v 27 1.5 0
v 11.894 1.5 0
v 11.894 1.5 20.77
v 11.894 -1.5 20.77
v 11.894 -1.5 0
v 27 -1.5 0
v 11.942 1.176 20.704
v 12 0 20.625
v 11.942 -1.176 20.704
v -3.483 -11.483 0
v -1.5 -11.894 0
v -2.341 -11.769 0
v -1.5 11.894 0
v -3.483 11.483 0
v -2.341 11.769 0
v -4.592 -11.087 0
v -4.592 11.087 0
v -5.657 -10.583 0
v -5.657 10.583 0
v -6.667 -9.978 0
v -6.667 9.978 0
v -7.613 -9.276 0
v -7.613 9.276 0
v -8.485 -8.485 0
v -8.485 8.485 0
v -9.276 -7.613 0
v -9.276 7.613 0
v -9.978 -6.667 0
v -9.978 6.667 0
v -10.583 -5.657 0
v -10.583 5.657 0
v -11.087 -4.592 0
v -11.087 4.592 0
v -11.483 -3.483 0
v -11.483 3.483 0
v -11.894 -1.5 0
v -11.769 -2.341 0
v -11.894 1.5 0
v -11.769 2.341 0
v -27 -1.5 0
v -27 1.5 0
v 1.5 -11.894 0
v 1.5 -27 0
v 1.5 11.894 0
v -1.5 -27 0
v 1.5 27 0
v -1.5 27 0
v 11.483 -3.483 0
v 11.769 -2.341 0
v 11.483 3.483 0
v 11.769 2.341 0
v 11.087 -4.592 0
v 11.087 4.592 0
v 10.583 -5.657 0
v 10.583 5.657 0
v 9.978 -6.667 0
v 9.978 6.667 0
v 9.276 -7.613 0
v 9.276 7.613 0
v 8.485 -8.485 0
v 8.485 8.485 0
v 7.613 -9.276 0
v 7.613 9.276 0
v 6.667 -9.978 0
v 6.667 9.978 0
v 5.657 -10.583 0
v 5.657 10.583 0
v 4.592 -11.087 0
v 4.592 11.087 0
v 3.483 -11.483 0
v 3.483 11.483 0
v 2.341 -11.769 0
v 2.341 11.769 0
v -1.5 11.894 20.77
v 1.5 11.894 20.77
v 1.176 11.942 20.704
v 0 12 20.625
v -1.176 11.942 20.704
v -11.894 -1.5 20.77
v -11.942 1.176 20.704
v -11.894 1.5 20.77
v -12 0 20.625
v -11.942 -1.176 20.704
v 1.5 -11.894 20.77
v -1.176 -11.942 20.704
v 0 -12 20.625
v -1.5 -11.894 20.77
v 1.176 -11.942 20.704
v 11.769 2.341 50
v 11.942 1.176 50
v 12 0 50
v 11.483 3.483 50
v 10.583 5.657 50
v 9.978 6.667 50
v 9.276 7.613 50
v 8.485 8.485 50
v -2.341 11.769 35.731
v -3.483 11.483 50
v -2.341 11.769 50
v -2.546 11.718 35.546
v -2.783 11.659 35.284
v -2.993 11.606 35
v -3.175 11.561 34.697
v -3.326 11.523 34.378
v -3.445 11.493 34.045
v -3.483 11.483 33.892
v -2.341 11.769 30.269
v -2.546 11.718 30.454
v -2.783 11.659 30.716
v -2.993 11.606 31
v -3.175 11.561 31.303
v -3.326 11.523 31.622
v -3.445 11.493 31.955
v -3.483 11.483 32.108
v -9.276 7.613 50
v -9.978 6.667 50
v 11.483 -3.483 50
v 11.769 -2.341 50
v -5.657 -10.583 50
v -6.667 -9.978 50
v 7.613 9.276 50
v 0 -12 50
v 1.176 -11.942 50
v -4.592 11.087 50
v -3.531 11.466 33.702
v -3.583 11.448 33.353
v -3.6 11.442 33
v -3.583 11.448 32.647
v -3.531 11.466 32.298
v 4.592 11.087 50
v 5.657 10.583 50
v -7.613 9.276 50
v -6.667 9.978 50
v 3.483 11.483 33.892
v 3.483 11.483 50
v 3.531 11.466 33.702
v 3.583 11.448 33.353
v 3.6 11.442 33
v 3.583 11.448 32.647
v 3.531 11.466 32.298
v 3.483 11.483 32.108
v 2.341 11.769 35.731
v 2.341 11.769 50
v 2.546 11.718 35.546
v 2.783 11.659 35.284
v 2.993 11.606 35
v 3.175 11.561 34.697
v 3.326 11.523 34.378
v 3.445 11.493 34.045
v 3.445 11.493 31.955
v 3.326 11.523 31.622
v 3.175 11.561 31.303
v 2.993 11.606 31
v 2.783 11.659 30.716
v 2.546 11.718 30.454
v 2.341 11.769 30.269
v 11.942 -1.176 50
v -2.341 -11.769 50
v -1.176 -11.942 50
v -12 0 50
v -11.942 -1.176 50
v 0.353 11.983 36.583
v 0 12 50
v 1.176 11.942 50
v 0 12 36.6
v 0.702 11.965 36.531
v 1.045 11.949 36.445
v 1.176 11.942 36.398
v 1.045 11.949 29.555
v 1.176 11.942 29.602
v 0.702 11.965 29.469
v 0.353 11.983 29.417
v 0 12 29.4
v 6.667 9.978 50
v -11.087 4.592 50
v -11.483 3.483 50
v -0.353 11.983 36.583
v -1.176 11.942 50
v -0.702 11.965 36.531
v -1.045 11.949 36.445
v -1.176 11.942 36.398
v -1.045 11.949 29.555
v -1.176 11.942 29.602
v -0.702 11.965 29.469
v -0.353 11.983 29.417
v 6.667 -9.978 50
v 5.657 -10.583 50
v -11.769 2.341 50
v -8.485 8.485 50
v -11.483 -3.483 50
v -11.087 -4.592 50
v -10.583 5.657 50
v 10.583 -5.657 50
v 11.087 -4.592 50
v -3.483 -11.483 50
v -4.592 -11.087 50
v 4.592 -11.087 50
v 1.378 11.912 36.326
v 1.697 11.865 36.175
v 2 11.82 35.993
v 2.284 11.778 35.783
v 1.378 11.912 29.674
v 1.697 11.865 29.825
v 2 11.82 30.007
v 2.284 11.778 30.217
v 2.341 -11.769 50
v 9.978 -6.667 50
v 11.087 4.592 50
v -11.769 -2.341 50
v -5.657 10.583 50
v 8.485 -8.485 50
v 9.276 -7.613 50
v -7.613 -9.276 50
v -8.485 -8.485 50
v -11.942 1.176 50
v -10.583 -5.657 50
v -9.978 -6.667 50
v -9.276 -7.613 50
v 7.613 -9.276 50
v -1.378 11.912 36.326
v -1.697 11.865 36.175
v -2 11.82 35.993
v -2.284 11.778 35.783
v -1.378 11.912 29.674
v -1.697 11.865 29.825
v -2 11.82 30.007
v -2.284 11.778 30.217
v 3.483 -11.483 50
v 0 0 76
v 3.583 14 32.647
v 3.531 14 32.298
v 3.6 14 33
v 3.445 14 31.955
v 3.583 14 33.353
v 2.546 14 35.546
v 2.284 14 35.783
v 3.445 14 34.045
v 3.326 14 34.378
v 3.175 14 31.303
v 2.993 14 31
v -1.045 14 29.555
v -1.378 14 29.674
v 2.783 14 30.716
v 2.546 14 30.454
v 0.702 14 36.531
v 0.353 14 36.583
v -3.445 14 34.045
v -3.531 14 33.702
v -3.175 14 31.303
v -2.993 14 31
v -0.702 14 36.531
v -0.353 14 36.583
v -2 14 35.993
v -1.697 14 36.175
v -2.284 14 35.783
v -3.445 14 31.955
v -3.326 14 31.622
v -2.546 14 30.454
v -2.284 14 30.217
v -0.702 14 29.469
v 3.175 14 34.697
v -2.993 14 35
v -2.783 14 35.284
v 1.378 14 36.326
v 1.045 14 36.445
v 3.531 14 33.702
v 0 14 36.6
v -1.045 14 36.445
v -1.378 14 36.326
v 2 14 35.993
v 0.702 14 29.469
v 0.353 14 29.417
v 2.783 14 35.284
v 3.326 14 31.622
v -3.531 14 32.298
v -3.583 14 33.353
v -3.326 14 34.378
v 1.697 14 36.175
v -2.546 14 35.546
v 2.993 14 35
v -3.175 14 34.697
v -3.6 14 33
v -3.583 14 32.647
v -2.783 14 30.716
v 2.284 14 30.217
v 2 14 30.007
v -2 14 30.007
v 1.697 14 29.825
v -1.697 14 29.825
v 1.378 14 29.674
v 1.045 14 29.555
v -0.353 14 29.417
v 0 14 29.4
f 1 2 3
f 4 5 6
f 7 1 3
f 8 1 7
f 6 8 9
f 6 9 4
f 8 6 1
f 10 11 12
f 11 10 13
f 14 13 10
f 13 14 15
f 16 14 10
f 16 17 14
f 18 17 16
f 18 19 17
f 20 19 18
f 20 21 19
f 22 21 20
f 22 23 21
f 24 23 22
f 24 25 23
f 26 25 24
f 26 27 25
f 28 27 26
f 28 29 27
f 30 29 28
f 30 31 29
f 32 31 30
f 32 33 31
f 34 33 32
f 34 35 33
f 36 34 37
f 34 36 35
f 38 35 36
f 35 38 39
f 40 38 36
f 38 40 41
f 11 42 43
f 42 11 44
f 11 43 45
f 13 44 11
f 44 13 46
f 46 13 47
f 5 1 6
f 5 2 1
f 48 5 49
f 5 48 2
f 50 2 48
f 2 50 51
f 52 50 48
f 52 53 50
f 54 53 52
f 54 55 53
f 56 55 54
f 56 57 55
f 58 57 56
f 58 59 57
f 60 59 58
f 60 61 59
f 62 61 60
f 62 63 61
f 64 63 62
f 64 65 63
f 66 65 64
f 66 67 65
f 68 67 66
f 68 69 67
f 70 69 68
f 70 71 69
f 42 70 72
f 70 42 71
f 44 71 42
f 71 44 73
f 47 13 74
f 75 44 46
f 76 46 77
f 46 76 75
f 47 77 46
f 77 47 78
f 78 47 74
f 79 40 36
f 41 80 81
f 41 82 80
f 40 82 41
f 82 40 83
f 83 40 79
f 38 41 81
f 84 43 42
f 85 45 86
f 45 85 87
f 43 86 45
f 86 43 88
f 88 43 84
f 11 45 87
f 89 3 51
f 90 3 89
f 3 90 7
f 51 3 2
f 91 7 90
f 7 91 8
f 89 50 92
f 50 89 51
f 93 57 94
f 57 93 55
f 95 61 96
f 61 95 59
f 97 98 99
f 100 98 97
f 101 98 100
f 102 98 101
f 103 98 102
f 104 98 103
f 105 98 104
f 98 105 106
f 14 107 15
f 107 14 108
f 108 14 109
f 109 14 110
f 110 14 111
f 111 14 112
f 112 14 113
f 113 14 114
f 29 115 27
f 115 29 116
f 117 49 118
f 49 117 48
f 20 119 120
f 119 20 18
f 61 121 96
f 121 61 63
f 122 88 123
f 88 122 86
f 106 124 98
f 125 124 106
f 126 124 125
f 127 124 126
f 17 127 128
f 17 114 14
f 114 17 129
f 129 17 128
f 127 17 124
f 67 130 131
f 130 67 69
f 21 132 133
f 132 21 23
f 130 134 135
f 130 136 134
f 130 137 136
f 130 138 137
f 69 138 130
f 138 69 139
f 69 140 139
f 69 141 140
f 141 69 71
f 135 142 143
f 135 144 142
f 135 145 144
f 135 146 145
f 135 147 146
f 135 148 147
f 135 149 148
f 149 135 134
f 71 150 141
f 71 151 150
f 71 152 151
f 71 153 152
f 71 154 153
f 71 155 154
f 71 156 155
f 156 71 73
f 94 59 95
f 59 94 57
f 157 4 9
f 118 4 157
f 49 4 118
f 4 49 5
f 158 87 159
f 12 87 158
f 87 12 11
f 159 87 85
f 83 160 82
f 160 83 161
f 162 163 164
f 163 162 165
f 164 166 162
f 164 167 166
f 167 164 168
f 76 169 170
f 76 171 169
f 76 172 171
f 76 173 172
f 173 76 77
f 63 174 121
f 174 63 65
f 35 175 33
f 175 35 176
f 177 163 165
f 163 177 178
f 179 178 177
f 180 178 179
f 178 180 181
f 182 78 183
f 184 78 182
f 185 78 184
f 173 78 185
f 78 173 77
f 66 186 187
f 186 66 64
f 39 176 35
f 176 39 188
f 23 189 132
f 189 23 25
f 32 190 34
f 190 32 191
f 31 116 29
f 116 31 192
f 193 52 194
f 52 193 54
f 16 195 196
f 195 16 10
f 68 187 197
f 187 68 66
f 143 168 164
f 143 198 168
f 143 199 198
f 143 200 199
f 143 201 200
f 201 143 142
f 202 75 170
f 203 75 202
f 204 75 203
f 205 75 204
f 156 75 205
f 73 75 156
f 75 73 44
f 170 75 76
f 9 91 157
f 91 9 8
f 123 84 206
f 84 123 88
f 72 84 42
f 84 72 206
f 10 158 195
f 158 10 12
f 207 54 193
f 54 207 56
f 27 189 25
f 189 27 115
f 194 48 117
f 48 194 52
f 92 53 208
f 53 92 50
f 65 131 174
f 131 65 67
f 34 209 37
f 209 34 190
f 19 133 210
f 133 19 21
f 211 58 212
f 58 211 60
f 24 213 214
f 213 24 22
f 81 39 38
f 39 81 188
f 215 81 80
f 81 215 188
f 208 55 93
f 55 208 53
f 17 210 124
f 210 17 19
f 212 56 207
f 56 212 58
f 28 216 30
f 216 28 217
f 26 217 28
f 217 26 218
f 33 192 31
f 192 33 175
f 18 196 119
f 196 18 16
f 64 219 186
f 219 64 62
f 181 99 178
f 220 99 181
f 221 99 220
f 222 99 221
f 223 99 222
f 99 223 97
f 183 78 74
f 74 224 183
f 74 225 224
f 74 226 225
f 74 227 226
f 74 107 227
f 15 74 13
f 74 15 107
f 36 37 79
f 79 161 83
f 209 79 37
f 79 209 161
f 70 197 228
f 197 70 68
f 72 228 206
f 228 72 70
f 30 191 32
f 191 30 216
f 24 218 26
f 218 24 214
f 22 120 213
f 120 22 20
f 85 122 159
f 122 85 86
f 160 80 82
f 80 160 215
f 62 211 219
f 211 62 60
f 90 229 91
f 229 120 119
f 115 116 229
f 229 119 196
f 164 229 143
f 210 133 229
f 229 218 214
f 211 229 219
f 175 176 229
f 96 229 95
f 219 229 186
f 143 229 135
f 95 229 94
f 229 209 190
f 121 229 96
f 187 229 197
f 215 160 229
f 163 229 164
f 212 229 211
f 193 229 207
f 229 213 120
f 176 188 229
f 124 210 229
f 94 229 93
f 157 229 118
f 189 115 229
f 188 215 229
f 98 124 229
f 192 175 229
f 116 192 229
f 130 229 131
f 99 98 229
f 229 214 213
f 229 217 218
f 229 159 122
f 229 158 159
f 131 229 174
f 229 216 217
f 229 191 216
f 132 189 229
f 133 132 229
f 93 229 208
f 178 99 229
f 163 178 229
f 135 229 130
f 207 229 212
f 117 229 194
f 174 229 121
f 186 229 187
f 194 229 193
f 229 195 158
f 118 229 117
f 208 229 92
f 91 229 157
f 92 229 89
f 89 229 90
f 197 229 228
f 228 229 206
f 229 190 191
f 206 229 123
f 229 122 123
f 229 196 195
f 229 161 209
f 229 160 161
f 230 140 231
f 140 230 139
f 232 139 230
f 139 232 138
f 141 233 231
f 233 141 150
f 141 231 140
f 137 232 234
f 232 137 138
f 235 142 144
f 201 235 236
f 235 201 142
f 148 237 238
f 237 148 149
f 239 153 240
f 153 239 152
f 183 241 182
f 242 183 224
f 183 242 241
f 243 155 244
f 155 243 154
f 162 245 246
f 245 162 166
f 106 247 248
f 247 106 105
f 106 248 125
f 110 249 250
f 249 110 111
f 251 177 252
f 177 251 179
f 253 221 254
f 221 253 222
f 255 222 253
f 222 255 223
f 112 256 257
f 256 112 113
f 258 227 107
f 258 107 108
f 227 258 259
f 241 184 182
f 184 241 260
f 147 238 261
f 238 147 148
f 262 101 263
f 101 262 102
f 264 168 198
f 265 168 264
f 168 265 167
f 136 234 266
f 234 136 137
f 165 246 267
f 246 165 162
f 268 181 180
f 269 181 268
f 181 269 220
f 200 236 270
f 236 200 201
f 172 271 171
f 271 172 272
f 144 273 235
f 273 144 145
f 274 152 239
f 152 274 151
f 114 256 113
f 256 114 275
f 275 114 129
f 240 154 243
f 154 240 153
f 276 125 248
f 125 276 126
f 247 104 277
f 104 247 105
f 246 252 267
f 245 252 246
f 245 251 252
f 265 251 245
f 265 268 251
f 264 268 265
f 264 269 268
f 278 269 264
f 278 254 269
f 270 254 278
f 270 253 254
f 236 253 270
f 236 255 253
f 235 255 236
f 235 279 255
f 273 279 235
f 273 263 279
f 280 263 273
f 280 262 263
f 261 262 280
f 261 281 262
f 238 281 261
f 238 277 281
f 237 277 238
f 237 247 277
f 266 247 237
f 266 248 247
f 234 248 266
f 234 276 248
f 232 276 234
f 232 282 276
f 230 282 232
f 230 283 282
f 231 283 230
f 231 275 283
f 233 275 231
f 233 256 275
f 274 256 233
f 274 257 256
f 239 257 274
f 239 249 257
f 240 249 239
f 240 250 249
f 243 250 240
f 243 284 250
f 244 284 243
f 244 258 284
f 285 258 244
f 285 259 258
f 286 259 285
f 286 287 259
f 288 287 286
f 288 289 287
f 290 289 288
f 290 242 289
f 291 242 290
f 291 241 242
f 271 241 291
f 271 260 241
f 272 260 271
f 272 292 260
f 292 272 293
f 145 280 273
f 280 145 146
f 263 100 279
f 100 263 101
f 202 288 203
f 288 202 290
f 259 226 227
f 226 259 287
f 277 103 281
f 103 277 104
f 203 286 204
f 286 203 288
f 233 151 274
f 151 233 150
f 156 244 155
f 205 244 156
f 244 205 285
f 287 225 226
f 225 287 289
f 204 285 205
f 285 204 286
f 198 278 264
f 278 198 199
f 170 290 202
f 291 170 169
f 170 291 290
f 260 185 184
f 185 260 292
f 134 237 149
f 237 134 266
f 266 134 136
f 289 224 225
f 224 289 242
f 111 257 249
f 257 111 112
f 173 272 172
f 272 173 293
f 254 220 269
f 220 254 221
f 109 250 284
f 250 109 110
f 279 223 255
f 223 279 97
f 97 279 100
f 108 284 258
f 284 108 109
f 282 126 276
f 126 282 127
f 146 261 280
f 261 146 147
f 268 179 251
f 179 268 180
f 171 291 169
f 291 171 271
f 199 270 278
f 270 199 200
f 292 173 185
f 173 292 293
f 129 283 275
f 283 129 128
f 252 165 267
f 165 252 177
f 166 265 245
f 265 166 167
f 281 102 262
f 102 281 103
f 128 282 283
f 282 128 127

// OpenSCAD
// =============================================================================
//  MULTI-COLOR ROCKET  -  a full-color example for 3MF export
//
//  Every part is wrapped in its own color(), so each becomes a separate colored
//  object in the exported 3MF and the colors survive into a multi-material
//  slicer (Bambu Studio, PrusaSlicer, OrcaSlicer, ...).
//
//    openrscad examples/rocket.scad -o rocket.3mf
//
//  The rocket stands on a flat base (z = 0), so it prints upright without
//  supports.
// =============================================================================
$fn = 64;

/* [Rocket] */
body_d    = 24;   // [16:40] body diameter
body_h    = 50;   // [30:80] body height
nose_h    = 26;   // [12:40] nose cone height
fin_count = 4;    // [3:6]   number of fins

/* [Fins] */
fin_len = 16;     // [8:28]  how far the fins sweep out
fin_h   = 22;     // [10:36] fin height up the body
fin_t   = 3;      // [1:6]   fin thickness

body_r = body_d / 2;

// Body ------------------------------------------------------------------------
color("Gainsboro")
  cylinder(h = body_h, r = body_r);

// Nose cone -------------------------------------------------------------------
color("Crimson")
  translate([0, 0, body_h])
    cylinder(h = nose_h, r1 = body_r, r2 = 0);

// Porthole window -------------------------------------------------------------
color("DeepSkyBlue")
  translate([0, body_r - 1, body_h * 0.66])
    rotate([-90, 0, 0])
      cylinder(h = 3, r = body_r * 0.3);

// Fins ------------------------------------------------------------------------
color("RoyalBlue")
  for (i = [0 : fin_count - 1])
    rotate([0, 0, i * 360 / fin_count])
      translate([body_r - 1, 0, 0])
        rotate([90, 0, 0])
          linear_extrude(height = fin_t, center = true)
            polygon([[0, 0], [fin_len, 0], [0, fin_h]]);
